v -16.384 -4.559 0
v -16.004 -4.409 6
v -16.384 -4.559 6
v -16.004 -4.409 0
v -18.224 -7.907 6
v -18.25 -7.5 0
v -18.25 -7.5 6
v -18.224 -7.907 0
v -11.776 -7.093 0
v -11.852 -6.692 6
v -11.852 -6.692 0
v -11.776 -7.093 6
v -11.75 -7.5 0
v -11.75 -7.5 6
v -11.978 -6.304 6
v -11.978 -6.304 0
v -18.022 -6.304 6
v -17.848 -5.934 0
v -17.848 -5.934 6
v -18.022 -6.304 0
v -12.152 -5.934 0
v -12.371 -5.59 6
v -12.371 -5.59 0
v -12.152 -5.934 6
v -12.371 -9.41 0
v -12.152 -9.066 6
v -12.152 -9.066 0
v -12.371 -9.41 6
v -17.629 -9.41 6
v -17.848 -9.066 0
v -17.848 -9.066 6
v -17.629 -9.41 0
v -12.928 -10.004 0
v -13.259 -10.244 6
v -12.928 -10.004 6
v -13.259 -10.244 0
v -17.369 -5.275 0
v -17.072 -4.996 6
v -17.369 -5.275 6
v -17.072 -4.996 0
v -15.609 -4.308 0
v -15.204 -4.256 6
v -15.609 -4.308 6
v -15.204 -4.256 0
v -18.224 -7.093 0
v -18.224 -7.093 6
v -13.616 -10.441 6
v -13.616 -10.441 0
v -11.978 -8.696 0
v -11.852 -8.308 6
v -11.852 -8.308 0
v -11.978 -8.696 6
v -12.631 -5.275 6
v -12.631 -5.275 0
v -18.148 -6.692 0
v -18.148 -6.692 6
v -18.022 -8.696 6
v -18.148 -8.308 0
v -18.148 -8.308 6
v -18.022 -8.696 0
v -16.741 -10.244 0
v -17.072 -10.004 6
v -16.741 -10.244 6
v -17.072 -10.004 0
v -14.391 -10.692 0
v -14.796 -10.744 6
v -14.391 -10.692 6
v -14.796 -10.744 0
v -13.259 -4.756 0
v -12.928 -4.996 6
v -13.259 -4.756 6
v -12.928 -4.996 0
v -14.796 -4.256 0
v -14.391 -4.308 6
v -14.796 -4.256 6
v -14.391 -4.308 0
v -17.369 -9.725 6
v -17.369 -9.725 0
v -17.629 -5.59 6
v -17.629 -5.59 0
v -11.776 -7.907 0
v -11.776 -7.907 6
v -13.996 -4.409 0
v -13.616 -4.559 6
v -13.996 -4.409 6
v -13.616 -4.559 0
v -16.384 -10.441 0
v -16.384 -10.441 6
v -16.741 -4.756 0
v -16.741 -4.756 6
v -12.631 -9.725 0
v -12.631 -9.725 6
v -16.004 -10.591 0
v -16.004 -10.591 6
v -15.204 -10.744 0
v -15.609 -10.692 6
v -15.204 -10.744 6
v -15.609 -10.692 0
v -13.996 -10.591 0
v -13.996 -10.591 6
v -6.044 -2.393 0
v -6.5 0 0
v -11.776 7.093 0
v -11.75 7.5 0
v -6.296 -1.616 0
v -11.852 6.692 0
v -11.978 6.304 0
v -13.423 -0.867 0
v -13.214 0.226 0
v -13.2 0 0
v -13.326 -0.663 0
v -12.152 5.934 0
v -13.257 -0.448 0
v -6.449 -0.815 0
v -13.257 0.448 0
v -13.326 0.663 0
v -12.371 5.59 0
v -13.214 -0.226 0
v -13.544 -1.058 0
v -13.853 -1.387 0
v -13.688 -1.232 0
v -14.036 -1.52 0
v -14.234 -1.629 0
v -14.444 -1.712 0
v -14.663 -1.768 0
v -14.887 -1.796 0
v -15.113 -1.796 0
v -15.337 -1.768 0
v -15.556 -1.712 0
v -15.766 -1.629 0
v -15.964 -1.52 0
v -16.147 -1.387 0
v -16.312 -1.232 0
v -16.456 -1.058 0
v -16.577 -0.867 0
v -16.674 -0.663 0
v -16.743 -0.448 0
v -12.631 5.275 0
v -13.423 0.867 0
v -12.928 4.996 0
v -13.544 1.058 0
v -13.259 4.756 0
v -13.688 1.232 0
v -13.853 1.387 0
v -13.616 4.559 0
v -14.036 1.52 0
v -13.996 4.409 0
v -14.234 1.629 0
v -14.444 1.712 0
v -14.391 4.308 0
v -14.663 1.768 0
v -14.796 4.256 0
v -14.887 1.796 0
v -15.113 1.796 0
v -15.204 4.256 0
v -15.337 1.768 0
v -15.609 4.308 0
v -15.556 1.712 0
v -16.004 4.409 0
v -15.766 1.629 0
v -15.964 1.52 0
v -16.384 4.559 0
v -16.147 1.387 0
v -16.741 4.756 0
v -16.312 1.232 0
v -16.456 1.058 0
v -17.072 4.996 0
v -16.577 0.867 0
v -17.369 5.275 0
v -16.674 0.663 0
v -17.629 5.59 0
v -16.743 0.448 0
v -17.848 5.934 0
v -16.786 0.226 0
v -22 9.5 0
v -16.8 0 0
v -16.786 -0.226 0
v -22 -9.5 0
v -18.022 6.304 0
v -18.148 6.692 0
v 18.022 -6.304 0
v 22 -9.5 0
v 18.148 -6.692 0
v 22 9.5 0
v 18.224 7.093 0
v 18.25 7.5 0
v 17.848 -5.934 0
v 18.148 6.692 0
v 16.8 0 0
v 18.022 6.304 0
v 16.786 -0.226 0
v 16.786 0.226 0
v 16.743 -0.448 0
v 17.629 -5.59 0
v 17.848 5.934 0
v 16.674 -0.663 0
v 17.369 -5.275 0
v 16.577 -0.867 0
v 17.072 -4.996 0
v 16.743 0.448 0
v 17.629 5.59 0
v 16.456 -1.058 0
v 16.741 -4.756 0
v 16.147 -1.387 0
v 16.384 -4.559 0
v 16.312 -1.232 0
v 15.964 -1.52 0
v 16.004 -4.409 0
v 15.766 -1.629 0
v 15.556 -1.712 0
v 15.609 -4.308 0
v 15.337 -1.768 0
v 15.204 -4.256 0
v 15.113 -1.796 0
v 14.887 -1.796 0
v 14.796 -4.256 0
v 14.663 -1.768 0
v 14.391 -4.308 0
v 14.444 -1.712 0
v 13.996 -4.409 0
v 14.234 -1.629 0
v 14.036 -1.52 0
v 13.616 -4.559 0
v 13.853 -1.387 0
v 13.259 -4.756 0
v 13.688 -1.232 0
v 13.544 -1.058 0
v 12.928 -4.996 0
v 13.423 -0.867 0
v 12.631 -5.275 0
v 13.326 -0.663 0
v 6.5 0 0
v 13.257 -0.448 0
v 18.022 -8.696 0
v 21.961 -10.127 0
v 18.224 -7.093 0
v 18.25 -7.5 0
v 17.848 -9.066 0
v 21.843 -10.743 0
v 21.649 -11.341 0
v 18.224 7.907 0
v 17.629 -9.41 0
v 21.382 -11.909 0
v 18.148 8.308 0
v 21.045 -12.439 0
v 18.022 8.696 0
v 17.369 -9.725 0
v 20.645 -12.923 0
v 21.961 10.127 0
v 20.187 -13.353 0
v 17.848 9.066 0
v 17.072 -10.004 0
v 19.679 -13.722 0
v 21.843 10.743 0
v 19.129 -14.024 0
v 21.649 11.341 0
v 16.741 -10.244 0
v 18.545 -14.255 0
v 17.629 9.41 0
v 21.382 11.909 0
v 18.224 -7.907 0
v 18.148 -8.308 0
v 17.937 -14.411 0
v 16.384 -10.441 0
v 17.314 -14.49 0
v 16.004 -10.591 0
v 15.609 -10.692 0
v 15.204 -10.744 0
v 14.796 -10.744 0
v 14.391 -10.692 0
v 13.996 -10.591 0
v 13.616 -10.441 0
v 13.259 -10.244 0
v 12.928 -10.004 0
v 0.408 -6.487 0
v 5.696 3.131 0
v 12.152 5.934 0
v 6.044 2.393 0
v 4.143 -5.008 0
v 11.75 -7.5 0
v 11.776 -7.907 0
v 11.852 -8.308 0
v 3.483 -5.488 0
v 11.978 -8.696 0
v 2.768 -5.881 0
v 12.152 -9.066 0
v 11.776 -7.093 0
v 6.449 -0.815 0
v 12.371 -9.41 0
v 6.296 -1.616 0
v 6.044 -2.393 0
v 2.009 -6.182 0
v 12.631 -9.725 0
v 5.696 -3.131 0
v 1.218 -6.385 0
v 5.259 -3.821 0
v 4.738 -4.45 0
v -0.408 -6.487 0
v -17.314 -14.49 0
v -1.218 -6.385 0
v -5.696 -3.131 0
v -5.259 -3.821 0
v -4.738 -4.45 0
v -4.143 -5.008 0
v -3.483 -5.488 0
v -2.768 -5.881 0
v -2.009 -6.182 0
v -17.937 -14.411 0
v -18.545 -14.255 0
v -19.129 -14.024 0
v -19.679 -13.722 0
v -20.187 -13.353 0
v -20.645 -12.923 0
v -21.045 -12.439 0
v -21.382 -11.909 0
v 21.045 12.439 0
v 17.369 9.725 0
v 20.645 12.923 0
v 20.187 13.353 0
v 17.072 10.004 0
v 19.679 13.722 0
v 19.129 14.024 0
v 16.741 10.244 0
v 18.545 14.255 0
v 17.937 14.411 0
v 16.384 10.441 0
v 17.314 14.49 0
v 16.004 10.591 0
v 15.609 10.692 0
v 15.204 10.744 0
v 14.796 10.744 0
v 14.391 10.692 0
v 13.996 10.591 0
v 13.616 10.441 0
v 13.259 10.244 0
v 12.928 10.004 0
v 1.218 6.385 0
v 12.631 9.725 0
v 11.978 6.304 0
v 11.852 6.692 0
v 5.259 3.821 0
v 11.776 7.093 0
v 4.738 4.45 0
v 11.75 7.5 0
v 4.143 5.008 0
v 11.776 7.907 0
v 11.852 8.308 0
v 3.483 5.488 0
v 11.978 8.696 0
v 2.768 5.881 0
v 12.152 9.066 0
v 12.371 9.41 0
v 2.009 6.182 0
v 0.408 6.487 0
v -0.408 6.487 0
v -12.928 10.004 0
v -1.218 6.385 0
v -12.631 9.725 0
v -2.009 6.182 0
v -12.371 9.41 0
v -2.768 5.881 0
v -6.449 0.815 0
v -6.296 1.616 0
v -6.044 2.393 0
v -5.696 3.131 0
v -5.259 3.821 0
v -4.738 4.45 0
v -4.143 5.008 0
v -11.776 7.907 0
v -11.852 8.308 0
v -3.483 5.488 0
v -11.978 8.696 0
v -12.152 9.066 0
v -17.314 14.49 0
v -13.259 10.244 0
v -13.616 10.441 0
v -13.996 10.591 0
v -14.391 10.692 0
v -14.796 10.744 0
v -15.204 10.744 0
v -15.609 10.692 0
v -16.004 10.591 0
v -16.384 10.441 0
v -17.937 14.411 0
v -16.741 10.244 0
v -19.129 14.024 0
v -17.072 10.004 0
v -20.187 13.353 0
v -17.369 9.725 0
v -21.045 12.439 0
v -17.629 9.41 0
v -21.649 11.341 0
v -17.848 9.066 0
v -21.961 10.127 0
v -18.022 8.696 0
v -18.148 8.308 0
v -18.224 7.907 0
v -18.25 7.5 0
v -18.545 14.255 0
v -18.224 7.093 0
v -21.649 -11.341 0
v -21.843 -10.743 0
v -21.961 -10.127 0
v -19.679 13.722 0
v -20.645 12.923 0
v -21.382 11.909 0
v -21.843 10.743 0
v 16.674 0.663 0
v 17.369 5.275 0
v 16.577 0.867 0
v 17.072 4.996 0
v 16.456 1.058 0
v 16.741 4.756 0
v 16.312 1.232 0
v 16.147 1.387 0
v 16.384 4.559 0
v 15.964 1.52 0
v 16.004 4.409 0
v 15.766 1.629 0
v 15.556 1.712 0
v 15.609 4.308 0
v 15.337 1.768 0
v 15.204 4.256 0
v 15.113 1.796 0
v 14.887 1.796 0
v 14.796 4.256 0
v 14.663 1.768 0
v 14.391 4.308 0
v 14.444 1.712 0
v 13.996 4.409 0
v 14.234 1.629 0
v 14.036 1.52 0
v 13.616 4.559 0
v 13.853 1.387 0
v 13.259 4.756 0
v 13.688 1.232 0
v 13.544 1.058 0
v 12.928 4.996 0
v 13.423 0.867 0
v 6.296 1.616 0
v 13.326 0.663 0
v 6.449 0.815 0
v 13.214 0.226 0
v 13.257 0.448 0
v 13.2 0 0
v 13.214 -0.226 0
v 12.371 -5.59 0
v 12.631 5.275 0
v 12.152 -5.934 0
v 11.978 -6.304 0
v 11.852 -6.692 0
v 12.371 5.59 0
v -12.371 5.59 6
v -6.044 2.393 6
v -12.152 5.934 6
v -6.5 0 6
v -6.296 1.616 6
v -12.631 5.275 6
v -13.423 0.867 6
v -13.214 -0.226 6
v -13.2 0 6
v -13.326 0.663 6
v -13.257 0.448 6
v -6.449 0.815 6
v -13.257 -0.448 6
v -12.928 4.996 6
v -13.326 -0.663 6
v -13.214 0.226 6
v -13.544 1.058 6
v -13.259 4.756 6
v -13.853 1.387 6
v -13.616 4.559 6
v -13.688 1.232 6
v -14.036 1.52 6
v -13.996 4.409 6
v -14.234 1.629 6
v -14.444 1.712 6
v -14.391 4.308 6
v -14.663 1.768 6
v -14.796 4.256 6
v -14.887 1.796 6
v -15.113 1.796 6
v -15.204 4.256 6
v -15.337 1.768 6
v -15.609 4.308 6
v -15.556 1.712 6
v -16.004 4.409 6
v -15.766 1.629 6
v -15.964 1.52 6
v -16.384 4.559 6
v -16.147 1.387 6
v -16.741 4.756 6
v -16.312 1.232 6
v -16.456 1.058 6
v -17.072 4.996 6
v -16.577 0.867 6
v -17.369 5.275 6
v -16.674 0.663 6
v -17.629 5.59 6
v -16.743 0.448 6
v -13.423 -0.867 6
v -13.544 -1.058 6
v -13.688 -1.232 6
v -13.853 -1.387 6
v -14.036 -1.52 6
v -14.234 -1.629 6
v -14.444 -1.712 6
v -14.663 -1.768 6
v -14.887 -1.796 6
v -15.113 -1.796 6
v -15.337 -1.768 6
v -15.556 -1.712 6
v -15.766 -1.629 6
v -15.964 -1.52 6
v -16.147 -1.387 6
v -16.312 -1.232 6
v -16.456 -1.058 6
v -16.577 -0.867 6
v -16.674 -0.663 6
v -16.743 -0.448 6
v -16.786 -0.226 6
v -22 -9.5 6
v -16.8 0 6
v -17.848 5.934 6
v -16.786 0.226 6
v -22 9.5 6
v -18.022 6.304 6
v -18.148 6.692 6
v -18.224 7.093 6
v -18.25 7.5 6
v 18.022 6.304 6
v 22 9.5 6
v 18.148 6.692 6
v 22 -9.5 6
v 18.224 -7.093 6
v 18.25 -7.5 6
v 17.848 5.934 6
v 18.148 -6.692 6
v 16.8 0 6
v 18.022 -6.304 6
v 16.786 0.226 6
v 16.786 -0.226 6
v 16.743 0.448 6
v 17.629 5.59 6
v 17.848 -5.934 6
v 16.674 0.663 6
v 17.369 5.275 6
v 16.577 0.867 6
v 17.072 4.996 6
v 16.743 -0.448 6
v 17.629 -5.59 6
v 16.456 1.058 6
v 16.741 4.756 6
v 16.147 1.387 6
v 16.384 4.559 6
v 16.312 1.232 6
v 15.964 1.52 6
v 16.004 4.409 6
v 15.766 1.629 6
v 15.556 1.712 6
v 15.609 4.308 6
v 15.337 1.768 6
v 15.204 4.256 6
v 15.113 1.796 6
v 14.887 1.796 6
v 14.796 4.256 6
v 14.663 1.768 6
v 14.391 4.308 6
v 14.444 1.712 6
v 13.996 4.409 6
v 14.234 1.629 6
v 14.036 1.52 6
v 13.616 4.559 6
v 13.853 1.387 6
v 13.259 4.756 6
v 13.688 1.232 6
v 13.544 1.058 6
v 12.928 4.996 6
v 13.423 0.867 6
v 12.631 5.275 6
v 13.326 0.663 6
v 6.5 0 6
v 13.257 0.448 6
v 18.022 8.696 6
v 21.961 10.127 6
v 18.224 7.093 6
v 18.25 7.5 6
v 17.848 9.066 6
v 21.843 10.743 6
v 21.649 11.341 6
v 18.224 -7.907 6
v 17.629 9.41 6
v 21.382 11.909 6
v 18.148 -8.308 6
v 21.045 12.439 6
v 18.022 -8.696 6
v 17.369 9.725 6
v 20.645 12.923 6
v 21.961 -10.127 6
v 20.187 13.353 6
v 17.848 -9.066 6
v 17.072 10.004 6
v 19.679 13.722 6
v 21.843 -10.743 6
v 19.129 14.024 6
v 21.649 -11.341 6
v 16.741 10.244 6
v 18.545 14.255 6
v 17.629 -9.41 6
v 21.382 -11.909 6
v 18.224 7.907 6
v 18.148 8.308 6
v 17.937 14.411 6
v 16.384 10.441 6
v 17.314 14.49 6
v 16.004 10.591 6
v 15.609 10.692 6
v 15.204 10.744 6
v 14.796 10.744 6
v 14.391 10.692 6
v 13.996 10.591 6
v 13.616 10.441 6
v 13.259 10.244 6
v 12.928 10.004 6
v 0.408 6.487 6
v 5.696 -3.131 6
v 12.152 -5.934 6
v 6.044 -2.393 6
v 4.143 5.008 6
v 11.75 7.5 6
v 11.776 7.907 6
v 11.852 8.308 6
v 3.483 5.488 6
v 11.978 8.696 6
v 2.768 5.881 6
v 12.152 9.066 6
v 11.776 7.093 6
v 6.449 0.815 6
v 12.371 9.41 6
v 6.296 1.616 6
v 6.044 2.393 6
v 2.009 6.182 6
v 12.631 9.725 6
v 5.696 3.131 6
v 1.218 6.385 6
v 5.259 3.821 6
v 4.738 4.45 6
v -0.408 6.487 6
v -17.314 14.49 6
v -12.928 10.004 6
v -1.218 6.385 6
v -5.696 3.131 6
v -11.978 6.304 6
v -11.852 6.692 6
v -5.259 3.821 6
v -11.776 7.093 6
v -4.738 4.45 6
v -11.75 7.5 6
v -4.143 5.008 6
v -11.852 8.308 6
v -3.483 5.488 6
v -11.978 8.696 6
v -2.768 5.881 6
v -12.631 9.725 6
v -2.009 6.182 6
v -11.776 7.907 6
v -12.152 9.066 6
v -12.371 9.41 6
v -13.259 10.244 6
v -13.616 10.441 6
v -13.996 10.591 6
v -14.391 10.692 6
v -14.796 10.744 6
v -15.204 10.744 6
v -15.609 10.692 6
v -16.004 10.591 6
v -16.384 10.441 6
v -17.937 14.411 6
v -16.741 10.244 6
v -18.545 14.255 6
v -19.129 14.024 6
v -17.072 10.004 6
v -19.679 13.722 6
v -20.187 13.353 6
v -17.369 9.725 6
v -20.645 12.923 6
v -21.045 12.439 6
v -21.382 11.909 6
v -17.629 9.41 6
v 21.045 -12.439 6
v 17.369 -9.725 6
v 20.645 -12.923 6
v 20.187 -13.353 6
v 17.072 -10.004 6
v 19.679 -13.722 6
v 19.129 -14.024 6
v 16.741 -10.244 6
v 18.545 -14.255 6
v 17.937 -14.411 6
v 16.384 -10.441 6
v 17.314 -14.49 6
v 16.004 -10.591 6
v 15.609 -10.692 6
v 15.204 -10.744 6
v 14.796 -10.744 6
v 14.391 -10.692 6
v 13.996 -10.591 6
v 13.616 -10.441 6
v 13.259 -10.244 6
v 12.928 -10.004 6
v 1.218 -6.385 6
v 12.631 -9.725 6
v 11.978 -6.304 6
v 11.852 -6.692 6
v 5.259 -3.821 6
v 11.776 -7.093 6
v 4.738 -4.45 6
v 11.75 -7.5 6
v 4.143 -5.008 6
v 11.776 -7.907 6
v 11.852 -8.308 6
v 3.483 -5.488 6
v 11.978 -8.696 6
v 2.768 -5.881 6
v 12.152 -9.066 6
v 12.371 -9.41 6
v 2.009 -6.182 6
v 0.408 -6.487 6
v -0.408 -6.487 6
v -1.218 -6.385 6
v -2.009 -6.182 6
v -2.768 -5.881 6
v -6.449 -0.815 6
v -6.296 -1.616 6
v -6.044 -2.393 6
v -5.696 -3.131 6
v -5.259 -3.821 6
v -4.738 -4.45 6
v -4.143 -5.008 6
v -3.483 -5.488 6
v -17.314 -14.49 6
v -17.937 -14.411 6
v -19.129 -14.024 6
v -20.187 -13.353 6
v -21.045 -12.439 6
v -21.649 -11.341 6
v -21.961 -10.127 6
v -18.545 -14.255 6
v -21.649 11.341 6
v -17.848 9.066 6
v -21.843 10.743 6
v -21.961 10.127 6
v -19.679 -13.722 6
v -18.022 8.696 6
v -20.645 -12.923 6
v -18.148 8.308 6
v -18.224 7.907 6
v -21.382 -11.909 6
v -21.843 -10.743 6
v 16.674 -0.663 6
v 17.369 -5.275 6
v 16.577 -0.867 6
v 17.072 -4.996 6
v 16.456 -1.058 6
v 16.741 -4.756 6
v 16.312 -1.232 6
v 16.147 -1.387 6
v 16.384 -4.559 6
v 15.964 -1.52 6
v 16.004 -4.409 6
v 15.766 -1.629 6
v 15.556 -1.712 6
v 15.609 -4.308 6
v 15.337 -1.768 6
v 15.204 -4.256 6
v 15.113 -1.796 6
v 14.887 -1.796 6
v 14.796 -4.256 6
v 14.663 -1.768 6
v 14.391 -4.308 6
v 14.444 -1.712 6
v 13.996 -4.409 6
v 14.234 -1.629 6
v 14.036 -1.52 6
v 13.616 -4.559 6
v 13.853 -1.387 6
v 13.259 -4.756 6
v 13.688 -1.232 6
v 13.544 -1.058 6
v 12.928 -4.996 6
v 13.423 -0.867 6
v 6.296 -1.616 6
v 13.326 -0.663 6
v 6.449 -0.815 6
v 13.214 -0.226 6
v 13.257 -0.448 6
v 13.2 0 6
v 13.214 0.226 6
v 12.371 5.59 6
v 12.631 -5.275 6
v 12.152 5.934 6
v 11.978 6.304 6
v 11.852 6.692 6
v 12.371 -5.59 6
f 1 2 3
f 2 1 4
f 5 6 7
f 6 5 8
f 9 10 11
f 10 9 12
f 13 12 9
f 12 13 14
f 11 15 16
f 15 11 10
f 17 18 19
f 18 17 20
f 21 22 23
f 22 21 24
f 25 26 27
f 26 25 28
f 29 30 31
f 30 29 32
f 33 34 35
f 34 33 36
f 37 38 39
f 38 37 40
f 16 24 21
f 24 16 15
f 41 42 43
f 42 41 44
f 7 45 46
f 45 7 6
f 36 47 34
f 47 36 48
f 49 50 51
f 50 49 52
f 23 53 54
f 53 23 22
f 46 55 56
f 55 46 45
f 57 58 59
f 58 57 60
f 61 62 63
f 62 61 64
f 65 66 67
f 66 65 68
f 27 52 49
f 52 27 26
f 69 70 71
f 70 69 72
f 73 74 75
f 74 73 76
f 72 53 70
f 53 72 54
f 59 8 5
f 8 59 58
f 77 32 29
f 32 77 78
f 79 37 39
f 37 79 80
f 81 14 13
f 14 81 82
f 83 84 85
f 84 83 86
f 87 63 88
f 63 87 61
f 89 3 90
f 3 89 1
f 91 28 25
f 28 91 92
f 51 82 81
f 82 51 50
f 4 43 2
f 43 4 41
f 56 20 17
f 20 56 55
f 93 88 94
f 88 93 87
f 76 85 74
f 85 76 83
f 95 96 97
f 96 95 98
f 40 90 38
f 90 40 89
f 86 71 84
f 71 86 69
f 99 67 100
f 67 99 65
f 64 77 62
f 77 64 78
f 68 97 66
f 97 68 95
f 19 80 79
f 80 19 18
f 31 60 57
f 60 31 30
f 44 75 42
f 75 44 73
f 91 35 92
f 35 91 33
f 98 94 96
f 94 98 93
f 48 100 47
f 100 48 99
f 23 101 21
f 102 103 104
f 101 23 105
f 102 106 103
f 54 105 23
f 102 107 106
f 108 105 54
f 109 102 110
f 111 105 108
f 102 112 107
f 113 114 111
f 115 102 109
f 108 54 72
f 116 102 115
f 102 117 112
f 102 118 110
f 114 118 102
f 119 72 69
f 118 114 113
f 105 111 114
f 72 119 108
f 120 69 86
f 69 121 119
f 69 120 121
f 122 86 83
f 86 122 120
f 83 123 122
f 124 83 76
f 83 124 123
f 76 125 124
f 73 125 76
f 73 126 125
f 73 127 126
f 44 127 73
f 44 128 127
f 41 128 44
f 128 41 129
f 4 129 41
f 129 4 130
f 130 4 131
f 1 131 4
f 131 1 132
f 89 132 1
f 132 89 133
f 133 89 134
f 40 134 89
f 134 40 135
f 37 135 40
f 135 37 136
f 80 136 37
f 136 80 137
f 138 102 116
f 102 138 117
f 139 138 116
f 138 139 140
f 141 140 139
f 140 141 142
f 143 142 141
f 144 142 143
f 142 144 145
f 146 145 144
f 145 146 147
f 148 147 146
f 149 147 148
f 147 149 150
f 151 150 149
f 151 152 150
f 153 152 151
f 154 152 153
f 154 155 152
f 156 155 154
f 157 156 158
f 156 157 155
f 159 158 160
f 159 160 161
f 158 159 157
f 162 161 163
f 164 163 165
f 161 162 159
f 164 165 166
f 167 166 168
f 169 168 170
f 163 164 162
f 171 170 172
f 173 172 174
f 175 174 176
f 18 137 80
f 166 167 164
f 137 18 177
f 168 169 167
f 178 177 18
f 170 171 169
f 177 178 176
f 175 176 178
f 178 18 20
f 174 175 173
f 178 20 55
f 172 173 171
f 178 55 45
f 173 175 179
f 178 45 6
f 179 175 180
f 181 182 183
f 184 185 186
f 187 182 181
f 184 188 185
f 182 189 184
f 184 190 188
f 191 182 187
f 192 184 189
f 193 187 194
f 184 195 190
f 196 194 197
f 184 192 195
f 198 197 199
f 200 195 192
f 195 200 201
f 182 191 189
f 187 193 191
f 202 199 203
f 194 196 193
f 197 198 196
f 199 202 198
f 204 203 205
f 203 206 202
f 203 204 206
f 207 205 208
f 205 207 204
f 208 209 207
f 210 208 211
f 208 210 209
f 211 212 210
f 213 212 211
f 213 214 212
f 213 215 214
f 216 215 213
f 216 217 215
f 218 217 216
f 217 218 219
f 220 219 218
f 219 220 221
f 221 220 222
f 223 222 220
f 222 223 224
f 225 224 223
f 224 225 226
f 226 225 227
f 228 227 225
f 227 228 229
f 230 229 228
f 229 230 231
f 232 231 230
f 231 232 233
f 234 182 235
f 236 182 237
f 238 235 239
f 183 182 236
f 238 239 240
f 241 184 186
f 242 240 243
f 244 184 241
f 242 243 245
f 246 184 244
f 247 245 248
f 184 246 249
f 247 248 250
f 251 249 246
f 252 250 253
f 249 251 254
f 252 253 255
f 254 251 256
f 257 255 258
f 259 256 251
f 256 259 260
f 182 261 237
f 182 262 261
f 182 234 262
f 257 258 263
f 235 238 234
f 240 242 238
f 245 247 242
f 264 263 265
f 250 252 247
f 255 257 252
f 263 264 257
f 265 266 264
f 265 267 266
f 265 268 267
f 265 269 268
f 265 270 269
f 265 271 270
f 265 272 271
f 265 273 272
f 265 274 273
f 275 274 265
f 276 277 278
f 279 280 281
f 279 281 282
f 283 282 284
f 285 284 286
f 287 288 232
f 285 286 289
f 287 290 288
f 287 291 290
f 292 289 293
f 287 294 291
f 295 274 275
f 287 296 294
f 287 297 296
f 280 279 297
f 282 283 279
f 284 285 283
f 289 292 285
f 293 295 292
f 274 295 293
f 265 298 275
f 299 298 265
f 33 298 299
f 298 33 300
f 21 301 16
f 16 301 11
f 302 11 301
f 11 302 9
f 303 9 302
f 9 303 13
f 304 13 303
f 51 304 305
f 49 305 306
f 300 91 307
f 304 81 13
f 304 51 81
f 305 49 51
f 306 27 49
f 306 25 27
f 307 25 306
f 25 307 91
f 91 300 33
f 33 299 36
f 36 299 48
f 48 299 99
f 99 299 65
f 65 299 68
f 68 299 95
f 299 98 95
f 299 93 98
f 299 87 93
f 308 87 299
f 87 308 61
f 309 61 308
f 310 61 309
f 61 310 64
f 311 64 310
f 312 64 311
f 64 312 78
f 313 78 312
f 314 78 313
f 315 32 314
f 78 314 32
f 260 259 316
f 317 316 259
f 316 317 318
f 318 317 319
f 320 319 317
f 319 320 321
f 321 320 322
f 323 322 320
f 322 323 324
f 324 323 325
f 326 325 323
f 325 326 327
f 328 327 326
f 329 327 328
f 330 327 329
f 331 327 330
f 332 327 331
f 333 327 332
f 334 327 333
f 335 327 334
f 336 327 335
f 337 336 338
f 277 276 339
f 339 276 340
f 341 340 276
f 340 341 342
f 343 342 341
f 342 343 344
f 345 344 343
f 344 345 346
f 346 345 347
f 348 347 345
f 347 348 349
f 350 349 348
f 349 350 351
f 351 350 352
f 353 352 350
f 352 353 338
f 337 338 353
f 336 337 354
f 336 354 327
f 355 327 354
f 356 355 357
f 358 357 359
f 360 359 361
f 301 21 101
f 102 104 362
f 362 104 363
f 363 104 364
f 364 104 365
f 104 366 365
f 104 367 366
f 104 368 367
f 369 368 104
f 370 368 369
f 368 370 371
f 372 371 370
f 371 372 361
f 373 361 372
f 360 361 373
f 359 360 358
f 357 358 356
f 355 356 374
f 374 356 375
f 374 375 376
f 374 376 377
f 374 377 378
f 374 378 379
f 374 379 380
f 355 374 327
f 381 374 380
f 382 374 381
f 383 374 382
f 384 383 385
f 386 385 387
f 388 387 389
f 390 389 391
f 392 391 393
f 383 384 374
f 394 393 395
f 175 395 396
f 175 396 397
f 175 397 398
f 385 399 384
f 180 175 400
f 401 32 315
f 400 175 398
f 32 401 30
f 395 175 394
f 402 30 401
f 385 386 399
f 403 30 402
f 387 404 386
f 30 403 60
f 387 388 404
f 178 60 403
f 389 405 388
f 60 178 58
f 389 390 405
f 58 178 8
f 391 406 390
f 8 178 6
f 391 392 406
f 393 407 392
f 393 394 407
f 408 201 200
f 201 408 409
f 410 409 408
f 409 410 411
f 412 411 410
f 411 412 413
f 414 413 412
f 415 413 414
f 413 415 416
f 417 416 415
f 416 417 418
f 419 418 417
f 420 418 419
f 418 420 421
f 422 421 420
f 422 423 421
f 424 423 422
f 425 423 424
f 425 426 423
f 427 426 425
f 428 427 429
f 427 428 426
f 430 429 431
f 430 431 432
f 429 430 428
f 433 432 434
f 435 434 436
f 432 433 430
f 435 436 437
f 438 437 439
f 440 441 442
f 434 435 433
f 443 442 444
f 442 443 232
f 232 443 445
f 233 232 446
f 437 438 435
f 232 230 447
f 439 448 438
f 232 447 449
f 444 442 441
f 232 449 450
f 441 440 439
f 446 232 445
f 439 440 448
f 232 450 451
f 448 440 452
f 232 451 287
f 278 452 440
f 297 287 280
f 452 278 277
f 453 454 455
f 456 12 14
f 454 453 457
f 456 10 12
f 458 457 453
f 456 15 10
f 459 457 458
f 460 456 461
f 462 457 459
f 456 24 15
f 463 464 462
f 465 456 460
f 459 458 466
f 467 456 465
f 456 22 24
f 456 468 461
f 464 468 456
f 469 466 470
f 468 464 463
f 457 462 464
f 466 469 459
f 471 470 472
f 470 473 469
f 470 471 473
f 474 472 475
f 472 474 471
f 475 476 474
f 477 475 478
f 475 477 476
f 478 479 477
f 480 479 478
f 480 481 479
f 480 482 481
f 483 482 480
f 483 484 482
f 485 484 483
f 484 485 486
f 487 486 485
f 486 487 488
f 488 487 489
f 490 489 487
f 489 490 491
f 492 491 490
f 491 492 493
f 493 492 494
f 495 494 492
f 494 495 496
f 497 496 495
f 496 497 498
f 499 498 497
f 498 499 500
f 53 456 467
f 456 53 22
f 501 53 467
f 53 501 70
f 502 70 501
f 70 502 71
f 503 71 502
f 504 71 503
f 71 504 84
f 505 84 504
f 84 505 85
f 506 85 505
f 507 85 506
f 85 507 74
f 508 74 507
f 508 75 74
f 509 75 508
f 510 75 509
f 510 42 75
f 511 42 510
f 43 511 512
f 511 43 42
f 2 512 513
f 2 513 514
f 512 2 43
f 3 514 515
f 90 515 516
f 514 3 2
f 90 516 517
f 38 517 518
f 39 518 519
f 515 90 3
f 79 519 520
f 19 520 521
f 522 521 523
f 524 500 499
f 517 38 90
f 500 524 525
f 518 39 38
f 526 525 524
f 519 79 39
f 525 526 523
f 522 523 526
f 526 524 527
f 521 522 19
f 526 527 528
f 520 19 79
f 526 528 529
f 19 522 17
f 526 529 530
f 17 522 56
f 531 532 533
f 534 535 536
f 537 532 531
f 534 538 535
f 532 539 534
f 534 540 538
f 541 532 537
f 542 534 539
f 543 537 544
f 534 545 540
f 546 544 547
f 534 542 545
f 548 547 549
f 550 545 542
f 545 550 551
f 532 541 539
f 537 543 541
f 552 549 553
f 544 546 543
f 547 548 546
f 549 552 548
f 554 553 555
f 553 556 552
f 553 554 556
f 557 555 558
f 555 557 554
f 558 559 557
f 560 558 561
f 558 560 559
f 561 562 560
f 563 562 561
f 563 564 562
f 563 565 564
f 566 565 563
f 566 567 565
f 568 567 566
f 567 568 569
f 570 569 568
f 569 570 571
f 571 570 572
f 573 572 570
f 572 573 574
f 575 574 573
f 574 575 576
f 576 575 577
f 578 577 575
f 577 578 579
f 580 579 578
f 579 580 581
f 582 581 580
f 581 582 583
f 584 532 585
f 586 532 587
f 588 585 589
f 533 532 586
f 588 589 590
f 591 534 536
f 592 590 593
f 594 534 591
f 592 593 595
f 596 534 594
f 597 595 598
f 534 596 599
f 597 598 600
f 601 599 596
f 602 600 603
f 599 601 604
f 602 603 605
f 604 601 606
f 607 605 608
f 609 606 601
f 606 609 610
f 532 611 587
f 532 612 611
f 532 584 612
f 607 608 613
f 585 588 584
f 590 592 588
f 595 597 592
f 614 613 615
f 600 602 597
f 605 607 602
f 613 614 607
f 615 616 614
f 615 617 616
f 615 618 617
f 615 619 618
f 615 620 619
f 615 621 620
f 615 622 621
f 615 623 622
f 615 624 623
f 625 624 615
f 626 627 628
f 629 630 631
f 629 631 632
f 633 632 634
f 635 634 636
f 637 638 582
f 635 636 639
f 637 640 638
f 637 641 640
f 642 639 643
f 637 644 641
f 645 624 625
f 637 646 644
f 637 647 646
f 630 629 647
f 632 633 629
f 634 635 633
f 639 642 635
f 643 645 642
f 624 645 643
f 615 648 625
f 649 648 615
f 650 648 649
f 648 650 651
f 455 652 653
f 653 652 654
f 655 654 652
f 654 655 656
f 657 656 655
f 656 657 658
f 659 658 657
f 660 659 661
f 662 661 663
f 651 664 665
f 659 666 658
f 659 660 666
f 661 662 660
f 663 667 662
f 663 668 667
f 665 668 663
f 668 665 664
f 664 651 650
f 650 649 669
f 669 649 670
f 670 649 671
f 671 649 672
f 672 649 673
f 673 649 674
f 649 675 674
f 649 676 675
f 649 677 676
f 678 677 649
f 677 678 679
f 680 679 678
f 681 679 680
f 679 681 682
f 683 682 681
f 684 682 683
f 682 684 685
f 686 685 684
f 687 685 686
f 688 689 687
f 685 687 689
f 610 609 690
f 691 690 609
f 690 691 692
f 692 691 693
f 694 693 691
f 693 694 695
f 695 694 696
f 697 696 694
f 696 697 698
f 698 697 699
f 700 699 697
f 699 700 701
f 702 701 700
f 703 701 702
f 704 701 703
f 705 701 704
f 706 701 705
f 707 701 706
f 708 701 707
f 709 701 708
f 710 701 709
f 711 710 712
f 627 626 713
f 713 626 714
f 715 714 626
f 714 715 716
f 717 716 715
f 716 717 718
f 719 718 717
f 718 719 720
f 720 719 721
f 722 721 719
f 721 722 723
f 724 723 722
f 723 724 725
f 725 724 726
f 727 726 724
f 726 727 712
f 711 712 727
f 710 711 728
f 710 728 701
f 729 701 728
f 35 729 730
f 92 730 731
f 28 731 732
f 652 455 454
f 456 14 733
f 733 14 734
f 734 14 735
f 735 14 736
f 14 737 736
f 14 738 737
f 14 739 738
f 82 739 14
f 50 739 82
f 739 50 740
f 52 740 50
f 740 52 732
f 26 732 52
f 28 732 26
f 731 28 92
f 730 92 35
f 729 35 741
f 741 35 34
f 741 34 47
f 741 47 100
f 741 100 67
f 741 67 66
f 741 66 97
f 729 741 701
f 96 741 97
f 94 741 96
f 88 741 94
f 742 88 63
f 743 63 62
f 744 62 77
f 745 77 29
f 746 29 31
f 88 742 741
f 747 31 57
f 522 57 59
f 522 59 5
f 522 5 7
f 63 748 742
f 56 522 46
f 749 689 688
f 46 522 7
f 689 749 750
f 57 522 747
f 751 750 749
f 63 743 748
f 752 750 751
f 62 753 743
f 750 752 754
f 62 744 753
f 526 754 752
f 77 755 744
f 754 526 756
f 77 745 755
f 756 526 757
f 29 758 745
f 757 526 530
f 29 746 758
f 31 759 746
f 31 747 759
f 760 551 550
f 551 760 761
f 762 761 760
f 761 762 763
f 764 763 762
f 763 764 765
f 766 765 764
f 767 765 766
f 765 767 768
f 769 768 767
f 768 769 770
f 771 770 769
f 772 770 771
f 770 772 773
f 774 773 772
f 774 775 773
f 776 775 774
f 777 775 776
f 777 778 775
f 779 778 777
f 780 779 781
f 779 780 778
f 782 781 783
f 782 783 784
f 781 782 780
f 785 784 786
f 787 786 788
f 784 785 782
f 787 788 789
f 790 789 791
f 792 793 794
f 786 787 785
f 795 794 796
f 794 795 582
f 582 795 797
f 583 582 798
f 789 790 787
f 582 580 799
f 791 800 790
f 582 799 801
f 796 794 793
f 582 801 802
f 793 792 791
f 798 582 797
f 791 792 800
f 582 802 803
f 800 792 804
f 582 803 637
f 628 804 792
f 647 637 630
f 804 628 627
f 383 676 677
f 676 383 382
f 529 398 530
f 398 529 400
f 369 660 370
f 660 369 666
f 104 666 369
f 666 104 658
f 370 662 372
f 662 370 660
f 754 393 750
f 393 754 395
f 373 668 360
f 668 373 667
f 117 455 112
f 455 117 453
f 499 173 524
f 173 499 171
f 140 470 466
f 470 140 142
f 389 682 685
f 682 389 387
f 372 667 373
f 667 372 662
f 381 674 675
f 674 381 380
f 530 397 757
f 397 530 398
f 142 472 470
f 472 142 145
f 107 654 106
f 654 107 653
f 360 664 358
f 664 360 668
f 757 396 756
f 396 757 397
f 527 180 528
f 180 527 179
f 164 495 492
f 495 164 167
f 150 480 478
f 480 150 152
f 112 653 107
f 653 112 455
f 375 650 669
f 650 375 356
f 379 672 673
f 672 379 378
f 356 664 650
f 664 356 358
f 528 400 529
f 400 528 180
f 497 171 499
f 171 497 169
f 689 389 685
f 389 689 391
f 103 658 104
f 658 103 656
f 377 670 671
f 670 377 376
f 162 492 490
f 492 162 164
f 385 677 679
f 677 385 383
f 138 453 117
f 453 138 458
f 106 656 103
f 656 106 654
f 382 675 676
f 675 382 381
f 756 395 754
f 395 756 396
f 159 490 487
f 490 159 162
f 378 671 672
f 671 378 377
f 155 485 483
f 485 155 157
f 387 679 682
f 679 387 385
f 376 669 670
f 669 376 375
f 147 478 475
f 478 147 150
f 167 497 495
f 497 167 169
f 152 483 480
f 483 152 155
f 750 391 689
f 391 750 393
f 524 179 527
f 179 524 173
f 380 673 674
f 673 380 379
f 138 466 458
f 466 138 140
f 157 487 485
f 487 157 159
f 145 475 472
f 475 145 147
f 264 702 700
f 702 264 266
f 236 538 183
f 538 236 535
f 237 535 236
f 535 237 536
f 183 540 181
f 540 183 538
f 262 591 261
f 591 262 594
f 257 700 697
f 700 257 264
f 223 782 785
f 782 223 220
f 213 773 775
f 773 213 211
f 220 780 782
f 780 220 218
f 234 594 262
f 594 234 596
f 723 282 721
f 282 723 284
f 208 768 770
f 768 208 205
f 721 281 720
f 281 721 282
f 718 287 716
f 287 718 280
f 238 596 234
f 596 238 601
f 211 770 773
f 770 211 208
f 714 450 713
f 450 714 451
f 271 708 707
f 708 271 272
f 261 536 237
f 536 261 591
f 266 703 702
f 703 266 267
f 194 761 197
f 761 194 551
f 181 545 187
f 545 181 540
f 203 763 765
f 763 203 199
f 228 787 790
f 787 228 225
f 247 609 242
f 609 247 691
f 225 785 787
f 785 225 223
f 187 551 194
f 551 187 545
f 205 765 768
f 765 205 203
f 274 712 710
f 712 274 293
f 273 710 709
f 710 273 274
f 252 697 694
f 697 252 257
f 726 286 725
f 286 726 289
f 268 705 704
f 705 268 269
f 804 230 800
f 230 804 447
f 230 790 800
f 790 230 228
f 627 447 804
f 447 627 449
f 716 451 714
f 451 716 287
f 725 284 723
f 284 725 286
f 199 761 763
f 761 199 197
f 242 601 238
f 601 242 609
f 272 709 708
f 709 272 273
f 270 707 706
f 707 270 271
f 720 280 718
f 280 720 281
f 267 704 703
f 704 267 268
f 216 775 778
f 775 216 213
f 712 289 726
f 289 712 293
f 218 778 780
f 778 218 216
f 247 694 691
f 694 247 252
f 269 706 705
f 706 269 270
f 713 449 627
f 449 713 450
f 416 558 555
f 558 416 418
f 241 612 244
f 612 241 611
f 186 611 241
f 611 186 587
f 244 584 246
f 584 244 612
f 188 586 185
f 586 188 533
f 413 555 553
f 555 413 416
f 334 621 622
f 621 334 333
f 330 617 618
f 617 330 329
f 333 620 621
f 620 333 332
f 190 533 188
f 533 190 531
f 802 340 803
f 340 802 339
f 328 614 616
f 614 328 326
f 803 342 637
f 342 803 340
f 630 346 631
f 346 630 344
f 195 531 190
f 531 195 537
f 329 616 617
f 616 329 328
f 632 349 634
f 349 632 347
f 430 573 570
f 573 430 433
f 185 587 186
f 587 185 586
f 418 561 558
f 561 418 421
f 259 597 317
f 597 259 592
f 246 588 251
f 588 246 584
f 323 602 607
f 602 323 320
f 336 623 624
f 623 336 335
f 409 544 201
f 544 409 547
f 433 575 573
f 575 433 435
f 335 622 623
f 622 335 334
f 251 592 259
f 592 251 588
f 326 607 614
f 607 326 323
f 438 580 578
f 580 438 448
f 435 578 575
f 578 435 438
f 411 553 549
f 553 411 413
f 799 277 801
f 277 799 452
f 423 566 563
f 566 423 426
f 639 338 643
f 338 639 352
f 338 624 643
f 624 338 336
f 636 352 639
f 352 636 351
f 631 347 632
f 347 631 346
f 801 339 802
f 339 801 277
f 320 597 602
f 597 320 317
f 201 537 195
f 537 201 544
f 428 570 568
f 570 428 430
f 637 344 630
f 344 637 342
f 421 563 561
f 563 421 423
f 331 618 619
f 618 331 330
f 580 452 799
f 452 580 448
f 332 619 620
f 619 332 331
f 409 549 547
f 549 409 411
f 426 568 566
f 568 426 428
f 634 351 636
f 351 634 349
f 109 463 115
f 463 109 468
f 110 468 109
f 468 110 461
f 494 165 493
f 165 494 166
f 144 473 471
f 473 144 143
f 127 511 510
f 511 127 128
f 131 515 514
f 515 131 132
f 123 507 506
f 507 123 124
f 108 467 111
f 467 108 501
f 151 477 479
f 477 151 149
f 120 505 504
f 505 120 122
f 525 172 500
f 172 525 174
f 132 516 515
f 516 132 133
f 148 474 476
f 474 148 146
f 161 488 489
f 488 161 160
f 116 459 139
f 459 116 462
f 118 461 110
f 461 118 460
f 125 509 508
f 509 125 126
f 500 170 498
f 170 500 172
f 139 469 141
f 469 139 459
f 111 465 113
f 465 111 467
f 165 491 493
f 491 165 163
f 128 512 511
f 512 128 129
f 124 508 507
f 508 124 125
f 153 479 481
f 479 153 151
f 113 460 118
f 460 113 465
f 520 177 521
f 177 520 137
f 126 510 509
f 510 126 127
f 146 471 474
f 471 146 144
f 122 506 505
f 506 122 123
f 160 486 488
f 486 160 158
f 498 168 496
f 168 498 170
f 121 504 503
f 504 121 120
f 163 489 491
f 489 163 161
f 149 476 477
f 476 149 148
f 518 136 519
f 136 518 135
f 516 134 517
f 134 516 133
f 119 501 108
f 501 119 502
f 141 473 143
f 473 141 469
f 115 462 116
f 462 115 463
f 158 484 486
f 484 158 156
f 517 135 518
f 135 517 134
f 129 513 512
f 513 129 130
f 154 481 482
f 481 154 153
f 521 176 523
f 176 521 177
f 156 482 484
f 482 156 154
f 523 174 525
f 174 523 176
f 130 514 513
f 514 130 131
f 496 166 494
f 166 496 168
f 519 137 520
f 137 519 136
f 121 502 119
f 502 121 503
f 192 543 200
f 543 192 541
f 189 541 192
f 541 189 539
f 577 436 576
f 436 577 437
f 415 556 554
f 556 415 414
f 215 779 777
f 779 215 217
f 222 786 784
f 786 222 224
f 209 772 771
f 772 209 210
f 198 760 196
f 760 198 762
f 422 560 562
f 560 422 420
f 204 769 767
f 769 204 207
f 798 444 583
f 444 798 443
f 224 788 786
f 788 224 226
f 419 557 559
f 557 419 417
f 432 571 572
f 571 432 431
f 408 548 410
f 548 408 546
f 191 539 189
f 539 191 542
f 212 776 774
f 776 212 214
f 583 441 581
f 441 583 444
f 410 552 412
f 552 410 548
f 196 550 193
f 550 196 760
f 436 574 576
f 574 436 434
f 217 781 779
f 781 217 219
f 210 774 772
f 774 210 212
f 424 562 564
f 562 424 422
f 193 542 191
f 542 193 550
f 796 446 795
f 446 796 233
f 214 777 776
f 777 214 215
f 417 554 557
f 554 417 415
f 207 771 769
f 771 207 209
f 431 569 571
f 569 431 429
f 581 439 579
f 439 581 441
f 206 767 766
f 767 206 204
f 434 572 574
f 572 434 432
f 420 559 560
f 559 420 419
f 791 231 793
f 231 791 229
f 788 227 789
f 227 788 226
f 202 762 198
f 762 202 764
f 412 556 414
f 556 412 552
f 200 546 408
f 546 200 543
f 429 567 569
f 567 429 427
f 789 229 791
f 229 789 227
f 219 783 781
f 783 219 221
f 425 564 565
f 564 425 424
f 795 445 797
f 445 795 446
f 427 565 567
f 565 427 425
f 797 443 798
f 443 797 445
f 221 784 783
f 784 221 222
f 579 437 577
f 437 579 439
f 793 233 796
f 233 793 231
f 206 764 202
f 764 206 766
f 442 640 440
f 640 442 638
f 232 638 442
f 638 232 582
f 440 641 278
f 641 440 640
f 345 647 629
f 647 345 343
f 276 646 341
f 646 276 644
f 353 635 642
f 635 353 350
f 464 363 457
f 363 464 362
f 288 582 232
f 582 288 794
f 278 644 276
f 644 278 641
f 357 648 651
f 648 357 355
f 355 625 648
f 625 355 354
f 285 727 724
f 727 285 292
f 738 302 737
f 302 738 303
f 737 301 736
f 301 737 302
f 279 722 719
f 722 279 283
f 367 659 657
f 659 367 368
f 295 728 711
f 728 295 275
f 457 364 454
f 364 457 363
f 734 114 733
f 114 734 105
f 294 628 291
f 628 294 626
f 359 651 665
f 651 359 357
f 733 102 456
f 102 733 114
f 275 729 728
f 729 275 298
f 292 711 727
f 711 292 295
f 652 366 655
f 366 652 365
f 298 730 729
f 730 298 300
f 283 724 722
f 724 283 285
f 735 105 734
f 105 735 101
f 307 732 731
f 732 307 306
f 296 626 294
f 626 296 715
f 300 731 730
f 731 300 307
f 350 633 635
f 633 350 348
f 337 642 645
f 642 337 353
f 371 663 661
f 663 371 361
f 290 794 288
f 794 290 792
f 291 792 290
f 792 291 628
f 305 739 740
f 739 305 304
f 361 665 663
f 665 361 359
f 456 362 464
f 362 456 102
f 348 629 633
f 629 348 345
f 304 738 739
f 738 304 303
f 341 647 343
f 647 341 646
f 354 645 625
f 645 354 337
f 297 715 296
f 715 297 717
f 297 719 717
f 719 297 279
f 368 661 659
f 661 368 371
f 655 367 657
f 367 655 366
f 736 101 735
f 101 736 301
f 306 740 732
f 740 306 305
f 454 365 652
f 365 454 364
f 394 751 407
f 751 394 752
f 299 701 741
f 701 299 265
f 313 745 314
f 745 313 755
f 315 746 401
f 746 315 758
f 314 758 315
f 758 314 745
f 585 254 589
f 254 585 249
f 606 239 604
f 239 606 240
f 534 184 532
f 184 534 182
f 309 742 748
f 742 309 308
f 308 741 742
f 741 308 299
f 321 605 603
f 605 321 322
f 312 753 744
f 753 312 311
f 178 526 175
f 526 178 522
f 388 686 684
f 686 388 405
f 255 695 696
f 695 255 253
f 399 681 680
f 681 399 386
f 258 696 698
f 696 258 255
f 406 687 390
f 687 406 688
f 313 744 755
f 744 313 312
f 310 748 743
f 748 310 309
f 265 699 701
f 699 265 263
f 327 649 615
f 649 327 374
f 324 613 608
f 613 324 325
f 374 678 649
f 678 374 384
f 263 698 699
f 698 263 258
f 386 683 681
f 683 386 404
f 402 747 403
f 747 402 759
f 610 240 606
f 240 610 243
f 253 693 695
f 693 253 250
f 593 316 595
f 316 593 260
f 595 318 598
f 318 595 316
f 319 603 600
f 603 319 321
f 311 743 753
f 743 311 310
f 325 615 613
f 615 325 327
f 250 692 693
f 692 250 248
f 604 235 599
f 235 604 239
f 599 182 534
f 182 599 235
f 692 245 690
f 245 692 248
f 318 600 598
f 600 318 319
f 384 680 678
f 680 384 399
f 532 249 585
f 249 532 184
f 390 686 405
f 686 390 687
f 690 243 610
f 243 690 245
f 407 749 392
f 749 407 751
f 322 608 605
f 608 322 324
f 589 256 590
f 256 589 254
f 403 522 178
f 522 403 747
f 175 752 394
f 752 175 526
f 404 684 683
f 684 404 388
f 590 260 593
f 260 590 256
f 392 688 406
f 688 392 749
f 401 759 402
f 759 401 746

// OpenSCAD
$fn = 50;

difference() {
	union() {
		hull() {
			translate(v = [-17.0, 9.5, 0]) {
				cylinder(h = 6, r = 5);
			}
			translate(v = [17.0, 9.5, 0]) {
				cylinder(h = 6, r = 5);
			}
			translate(v = [-17.0, -9.5, 0]) {
				cylinder(h = 6, r = 5);
			}
			translate(v = [17.0, -9.5, 0]) {
				cylinder(h = 6, r = 5);
			}
		}
	}
	union() {
		translate(v = [-15.0, -7.5, 0]) {
			cylinder(h = 6, r = 3.25);
		}
		translate(v = [-15.0, 7.5, 0]) {
			cylinder(h = 6, r = 3.25);
		}
		translate(v = [15.0, -7.5, 0]) {
			cylinder(h = 6, r = 3.25);
		}
		translate(v = [15.0, 7.5, 0]) {
			cylinder(h = 6, r = 3.25);
		}
		translate(v = [-15.0, 0.0, 0]) {
			cylinder(h = 6, r = 1.8);
		}
		translate(v = [15.0, 0.0, 0]) {
			cylinder(h = 6, r = 1.8);
		}
		cylinder(h = 6, r = 6.5);
	}
}
